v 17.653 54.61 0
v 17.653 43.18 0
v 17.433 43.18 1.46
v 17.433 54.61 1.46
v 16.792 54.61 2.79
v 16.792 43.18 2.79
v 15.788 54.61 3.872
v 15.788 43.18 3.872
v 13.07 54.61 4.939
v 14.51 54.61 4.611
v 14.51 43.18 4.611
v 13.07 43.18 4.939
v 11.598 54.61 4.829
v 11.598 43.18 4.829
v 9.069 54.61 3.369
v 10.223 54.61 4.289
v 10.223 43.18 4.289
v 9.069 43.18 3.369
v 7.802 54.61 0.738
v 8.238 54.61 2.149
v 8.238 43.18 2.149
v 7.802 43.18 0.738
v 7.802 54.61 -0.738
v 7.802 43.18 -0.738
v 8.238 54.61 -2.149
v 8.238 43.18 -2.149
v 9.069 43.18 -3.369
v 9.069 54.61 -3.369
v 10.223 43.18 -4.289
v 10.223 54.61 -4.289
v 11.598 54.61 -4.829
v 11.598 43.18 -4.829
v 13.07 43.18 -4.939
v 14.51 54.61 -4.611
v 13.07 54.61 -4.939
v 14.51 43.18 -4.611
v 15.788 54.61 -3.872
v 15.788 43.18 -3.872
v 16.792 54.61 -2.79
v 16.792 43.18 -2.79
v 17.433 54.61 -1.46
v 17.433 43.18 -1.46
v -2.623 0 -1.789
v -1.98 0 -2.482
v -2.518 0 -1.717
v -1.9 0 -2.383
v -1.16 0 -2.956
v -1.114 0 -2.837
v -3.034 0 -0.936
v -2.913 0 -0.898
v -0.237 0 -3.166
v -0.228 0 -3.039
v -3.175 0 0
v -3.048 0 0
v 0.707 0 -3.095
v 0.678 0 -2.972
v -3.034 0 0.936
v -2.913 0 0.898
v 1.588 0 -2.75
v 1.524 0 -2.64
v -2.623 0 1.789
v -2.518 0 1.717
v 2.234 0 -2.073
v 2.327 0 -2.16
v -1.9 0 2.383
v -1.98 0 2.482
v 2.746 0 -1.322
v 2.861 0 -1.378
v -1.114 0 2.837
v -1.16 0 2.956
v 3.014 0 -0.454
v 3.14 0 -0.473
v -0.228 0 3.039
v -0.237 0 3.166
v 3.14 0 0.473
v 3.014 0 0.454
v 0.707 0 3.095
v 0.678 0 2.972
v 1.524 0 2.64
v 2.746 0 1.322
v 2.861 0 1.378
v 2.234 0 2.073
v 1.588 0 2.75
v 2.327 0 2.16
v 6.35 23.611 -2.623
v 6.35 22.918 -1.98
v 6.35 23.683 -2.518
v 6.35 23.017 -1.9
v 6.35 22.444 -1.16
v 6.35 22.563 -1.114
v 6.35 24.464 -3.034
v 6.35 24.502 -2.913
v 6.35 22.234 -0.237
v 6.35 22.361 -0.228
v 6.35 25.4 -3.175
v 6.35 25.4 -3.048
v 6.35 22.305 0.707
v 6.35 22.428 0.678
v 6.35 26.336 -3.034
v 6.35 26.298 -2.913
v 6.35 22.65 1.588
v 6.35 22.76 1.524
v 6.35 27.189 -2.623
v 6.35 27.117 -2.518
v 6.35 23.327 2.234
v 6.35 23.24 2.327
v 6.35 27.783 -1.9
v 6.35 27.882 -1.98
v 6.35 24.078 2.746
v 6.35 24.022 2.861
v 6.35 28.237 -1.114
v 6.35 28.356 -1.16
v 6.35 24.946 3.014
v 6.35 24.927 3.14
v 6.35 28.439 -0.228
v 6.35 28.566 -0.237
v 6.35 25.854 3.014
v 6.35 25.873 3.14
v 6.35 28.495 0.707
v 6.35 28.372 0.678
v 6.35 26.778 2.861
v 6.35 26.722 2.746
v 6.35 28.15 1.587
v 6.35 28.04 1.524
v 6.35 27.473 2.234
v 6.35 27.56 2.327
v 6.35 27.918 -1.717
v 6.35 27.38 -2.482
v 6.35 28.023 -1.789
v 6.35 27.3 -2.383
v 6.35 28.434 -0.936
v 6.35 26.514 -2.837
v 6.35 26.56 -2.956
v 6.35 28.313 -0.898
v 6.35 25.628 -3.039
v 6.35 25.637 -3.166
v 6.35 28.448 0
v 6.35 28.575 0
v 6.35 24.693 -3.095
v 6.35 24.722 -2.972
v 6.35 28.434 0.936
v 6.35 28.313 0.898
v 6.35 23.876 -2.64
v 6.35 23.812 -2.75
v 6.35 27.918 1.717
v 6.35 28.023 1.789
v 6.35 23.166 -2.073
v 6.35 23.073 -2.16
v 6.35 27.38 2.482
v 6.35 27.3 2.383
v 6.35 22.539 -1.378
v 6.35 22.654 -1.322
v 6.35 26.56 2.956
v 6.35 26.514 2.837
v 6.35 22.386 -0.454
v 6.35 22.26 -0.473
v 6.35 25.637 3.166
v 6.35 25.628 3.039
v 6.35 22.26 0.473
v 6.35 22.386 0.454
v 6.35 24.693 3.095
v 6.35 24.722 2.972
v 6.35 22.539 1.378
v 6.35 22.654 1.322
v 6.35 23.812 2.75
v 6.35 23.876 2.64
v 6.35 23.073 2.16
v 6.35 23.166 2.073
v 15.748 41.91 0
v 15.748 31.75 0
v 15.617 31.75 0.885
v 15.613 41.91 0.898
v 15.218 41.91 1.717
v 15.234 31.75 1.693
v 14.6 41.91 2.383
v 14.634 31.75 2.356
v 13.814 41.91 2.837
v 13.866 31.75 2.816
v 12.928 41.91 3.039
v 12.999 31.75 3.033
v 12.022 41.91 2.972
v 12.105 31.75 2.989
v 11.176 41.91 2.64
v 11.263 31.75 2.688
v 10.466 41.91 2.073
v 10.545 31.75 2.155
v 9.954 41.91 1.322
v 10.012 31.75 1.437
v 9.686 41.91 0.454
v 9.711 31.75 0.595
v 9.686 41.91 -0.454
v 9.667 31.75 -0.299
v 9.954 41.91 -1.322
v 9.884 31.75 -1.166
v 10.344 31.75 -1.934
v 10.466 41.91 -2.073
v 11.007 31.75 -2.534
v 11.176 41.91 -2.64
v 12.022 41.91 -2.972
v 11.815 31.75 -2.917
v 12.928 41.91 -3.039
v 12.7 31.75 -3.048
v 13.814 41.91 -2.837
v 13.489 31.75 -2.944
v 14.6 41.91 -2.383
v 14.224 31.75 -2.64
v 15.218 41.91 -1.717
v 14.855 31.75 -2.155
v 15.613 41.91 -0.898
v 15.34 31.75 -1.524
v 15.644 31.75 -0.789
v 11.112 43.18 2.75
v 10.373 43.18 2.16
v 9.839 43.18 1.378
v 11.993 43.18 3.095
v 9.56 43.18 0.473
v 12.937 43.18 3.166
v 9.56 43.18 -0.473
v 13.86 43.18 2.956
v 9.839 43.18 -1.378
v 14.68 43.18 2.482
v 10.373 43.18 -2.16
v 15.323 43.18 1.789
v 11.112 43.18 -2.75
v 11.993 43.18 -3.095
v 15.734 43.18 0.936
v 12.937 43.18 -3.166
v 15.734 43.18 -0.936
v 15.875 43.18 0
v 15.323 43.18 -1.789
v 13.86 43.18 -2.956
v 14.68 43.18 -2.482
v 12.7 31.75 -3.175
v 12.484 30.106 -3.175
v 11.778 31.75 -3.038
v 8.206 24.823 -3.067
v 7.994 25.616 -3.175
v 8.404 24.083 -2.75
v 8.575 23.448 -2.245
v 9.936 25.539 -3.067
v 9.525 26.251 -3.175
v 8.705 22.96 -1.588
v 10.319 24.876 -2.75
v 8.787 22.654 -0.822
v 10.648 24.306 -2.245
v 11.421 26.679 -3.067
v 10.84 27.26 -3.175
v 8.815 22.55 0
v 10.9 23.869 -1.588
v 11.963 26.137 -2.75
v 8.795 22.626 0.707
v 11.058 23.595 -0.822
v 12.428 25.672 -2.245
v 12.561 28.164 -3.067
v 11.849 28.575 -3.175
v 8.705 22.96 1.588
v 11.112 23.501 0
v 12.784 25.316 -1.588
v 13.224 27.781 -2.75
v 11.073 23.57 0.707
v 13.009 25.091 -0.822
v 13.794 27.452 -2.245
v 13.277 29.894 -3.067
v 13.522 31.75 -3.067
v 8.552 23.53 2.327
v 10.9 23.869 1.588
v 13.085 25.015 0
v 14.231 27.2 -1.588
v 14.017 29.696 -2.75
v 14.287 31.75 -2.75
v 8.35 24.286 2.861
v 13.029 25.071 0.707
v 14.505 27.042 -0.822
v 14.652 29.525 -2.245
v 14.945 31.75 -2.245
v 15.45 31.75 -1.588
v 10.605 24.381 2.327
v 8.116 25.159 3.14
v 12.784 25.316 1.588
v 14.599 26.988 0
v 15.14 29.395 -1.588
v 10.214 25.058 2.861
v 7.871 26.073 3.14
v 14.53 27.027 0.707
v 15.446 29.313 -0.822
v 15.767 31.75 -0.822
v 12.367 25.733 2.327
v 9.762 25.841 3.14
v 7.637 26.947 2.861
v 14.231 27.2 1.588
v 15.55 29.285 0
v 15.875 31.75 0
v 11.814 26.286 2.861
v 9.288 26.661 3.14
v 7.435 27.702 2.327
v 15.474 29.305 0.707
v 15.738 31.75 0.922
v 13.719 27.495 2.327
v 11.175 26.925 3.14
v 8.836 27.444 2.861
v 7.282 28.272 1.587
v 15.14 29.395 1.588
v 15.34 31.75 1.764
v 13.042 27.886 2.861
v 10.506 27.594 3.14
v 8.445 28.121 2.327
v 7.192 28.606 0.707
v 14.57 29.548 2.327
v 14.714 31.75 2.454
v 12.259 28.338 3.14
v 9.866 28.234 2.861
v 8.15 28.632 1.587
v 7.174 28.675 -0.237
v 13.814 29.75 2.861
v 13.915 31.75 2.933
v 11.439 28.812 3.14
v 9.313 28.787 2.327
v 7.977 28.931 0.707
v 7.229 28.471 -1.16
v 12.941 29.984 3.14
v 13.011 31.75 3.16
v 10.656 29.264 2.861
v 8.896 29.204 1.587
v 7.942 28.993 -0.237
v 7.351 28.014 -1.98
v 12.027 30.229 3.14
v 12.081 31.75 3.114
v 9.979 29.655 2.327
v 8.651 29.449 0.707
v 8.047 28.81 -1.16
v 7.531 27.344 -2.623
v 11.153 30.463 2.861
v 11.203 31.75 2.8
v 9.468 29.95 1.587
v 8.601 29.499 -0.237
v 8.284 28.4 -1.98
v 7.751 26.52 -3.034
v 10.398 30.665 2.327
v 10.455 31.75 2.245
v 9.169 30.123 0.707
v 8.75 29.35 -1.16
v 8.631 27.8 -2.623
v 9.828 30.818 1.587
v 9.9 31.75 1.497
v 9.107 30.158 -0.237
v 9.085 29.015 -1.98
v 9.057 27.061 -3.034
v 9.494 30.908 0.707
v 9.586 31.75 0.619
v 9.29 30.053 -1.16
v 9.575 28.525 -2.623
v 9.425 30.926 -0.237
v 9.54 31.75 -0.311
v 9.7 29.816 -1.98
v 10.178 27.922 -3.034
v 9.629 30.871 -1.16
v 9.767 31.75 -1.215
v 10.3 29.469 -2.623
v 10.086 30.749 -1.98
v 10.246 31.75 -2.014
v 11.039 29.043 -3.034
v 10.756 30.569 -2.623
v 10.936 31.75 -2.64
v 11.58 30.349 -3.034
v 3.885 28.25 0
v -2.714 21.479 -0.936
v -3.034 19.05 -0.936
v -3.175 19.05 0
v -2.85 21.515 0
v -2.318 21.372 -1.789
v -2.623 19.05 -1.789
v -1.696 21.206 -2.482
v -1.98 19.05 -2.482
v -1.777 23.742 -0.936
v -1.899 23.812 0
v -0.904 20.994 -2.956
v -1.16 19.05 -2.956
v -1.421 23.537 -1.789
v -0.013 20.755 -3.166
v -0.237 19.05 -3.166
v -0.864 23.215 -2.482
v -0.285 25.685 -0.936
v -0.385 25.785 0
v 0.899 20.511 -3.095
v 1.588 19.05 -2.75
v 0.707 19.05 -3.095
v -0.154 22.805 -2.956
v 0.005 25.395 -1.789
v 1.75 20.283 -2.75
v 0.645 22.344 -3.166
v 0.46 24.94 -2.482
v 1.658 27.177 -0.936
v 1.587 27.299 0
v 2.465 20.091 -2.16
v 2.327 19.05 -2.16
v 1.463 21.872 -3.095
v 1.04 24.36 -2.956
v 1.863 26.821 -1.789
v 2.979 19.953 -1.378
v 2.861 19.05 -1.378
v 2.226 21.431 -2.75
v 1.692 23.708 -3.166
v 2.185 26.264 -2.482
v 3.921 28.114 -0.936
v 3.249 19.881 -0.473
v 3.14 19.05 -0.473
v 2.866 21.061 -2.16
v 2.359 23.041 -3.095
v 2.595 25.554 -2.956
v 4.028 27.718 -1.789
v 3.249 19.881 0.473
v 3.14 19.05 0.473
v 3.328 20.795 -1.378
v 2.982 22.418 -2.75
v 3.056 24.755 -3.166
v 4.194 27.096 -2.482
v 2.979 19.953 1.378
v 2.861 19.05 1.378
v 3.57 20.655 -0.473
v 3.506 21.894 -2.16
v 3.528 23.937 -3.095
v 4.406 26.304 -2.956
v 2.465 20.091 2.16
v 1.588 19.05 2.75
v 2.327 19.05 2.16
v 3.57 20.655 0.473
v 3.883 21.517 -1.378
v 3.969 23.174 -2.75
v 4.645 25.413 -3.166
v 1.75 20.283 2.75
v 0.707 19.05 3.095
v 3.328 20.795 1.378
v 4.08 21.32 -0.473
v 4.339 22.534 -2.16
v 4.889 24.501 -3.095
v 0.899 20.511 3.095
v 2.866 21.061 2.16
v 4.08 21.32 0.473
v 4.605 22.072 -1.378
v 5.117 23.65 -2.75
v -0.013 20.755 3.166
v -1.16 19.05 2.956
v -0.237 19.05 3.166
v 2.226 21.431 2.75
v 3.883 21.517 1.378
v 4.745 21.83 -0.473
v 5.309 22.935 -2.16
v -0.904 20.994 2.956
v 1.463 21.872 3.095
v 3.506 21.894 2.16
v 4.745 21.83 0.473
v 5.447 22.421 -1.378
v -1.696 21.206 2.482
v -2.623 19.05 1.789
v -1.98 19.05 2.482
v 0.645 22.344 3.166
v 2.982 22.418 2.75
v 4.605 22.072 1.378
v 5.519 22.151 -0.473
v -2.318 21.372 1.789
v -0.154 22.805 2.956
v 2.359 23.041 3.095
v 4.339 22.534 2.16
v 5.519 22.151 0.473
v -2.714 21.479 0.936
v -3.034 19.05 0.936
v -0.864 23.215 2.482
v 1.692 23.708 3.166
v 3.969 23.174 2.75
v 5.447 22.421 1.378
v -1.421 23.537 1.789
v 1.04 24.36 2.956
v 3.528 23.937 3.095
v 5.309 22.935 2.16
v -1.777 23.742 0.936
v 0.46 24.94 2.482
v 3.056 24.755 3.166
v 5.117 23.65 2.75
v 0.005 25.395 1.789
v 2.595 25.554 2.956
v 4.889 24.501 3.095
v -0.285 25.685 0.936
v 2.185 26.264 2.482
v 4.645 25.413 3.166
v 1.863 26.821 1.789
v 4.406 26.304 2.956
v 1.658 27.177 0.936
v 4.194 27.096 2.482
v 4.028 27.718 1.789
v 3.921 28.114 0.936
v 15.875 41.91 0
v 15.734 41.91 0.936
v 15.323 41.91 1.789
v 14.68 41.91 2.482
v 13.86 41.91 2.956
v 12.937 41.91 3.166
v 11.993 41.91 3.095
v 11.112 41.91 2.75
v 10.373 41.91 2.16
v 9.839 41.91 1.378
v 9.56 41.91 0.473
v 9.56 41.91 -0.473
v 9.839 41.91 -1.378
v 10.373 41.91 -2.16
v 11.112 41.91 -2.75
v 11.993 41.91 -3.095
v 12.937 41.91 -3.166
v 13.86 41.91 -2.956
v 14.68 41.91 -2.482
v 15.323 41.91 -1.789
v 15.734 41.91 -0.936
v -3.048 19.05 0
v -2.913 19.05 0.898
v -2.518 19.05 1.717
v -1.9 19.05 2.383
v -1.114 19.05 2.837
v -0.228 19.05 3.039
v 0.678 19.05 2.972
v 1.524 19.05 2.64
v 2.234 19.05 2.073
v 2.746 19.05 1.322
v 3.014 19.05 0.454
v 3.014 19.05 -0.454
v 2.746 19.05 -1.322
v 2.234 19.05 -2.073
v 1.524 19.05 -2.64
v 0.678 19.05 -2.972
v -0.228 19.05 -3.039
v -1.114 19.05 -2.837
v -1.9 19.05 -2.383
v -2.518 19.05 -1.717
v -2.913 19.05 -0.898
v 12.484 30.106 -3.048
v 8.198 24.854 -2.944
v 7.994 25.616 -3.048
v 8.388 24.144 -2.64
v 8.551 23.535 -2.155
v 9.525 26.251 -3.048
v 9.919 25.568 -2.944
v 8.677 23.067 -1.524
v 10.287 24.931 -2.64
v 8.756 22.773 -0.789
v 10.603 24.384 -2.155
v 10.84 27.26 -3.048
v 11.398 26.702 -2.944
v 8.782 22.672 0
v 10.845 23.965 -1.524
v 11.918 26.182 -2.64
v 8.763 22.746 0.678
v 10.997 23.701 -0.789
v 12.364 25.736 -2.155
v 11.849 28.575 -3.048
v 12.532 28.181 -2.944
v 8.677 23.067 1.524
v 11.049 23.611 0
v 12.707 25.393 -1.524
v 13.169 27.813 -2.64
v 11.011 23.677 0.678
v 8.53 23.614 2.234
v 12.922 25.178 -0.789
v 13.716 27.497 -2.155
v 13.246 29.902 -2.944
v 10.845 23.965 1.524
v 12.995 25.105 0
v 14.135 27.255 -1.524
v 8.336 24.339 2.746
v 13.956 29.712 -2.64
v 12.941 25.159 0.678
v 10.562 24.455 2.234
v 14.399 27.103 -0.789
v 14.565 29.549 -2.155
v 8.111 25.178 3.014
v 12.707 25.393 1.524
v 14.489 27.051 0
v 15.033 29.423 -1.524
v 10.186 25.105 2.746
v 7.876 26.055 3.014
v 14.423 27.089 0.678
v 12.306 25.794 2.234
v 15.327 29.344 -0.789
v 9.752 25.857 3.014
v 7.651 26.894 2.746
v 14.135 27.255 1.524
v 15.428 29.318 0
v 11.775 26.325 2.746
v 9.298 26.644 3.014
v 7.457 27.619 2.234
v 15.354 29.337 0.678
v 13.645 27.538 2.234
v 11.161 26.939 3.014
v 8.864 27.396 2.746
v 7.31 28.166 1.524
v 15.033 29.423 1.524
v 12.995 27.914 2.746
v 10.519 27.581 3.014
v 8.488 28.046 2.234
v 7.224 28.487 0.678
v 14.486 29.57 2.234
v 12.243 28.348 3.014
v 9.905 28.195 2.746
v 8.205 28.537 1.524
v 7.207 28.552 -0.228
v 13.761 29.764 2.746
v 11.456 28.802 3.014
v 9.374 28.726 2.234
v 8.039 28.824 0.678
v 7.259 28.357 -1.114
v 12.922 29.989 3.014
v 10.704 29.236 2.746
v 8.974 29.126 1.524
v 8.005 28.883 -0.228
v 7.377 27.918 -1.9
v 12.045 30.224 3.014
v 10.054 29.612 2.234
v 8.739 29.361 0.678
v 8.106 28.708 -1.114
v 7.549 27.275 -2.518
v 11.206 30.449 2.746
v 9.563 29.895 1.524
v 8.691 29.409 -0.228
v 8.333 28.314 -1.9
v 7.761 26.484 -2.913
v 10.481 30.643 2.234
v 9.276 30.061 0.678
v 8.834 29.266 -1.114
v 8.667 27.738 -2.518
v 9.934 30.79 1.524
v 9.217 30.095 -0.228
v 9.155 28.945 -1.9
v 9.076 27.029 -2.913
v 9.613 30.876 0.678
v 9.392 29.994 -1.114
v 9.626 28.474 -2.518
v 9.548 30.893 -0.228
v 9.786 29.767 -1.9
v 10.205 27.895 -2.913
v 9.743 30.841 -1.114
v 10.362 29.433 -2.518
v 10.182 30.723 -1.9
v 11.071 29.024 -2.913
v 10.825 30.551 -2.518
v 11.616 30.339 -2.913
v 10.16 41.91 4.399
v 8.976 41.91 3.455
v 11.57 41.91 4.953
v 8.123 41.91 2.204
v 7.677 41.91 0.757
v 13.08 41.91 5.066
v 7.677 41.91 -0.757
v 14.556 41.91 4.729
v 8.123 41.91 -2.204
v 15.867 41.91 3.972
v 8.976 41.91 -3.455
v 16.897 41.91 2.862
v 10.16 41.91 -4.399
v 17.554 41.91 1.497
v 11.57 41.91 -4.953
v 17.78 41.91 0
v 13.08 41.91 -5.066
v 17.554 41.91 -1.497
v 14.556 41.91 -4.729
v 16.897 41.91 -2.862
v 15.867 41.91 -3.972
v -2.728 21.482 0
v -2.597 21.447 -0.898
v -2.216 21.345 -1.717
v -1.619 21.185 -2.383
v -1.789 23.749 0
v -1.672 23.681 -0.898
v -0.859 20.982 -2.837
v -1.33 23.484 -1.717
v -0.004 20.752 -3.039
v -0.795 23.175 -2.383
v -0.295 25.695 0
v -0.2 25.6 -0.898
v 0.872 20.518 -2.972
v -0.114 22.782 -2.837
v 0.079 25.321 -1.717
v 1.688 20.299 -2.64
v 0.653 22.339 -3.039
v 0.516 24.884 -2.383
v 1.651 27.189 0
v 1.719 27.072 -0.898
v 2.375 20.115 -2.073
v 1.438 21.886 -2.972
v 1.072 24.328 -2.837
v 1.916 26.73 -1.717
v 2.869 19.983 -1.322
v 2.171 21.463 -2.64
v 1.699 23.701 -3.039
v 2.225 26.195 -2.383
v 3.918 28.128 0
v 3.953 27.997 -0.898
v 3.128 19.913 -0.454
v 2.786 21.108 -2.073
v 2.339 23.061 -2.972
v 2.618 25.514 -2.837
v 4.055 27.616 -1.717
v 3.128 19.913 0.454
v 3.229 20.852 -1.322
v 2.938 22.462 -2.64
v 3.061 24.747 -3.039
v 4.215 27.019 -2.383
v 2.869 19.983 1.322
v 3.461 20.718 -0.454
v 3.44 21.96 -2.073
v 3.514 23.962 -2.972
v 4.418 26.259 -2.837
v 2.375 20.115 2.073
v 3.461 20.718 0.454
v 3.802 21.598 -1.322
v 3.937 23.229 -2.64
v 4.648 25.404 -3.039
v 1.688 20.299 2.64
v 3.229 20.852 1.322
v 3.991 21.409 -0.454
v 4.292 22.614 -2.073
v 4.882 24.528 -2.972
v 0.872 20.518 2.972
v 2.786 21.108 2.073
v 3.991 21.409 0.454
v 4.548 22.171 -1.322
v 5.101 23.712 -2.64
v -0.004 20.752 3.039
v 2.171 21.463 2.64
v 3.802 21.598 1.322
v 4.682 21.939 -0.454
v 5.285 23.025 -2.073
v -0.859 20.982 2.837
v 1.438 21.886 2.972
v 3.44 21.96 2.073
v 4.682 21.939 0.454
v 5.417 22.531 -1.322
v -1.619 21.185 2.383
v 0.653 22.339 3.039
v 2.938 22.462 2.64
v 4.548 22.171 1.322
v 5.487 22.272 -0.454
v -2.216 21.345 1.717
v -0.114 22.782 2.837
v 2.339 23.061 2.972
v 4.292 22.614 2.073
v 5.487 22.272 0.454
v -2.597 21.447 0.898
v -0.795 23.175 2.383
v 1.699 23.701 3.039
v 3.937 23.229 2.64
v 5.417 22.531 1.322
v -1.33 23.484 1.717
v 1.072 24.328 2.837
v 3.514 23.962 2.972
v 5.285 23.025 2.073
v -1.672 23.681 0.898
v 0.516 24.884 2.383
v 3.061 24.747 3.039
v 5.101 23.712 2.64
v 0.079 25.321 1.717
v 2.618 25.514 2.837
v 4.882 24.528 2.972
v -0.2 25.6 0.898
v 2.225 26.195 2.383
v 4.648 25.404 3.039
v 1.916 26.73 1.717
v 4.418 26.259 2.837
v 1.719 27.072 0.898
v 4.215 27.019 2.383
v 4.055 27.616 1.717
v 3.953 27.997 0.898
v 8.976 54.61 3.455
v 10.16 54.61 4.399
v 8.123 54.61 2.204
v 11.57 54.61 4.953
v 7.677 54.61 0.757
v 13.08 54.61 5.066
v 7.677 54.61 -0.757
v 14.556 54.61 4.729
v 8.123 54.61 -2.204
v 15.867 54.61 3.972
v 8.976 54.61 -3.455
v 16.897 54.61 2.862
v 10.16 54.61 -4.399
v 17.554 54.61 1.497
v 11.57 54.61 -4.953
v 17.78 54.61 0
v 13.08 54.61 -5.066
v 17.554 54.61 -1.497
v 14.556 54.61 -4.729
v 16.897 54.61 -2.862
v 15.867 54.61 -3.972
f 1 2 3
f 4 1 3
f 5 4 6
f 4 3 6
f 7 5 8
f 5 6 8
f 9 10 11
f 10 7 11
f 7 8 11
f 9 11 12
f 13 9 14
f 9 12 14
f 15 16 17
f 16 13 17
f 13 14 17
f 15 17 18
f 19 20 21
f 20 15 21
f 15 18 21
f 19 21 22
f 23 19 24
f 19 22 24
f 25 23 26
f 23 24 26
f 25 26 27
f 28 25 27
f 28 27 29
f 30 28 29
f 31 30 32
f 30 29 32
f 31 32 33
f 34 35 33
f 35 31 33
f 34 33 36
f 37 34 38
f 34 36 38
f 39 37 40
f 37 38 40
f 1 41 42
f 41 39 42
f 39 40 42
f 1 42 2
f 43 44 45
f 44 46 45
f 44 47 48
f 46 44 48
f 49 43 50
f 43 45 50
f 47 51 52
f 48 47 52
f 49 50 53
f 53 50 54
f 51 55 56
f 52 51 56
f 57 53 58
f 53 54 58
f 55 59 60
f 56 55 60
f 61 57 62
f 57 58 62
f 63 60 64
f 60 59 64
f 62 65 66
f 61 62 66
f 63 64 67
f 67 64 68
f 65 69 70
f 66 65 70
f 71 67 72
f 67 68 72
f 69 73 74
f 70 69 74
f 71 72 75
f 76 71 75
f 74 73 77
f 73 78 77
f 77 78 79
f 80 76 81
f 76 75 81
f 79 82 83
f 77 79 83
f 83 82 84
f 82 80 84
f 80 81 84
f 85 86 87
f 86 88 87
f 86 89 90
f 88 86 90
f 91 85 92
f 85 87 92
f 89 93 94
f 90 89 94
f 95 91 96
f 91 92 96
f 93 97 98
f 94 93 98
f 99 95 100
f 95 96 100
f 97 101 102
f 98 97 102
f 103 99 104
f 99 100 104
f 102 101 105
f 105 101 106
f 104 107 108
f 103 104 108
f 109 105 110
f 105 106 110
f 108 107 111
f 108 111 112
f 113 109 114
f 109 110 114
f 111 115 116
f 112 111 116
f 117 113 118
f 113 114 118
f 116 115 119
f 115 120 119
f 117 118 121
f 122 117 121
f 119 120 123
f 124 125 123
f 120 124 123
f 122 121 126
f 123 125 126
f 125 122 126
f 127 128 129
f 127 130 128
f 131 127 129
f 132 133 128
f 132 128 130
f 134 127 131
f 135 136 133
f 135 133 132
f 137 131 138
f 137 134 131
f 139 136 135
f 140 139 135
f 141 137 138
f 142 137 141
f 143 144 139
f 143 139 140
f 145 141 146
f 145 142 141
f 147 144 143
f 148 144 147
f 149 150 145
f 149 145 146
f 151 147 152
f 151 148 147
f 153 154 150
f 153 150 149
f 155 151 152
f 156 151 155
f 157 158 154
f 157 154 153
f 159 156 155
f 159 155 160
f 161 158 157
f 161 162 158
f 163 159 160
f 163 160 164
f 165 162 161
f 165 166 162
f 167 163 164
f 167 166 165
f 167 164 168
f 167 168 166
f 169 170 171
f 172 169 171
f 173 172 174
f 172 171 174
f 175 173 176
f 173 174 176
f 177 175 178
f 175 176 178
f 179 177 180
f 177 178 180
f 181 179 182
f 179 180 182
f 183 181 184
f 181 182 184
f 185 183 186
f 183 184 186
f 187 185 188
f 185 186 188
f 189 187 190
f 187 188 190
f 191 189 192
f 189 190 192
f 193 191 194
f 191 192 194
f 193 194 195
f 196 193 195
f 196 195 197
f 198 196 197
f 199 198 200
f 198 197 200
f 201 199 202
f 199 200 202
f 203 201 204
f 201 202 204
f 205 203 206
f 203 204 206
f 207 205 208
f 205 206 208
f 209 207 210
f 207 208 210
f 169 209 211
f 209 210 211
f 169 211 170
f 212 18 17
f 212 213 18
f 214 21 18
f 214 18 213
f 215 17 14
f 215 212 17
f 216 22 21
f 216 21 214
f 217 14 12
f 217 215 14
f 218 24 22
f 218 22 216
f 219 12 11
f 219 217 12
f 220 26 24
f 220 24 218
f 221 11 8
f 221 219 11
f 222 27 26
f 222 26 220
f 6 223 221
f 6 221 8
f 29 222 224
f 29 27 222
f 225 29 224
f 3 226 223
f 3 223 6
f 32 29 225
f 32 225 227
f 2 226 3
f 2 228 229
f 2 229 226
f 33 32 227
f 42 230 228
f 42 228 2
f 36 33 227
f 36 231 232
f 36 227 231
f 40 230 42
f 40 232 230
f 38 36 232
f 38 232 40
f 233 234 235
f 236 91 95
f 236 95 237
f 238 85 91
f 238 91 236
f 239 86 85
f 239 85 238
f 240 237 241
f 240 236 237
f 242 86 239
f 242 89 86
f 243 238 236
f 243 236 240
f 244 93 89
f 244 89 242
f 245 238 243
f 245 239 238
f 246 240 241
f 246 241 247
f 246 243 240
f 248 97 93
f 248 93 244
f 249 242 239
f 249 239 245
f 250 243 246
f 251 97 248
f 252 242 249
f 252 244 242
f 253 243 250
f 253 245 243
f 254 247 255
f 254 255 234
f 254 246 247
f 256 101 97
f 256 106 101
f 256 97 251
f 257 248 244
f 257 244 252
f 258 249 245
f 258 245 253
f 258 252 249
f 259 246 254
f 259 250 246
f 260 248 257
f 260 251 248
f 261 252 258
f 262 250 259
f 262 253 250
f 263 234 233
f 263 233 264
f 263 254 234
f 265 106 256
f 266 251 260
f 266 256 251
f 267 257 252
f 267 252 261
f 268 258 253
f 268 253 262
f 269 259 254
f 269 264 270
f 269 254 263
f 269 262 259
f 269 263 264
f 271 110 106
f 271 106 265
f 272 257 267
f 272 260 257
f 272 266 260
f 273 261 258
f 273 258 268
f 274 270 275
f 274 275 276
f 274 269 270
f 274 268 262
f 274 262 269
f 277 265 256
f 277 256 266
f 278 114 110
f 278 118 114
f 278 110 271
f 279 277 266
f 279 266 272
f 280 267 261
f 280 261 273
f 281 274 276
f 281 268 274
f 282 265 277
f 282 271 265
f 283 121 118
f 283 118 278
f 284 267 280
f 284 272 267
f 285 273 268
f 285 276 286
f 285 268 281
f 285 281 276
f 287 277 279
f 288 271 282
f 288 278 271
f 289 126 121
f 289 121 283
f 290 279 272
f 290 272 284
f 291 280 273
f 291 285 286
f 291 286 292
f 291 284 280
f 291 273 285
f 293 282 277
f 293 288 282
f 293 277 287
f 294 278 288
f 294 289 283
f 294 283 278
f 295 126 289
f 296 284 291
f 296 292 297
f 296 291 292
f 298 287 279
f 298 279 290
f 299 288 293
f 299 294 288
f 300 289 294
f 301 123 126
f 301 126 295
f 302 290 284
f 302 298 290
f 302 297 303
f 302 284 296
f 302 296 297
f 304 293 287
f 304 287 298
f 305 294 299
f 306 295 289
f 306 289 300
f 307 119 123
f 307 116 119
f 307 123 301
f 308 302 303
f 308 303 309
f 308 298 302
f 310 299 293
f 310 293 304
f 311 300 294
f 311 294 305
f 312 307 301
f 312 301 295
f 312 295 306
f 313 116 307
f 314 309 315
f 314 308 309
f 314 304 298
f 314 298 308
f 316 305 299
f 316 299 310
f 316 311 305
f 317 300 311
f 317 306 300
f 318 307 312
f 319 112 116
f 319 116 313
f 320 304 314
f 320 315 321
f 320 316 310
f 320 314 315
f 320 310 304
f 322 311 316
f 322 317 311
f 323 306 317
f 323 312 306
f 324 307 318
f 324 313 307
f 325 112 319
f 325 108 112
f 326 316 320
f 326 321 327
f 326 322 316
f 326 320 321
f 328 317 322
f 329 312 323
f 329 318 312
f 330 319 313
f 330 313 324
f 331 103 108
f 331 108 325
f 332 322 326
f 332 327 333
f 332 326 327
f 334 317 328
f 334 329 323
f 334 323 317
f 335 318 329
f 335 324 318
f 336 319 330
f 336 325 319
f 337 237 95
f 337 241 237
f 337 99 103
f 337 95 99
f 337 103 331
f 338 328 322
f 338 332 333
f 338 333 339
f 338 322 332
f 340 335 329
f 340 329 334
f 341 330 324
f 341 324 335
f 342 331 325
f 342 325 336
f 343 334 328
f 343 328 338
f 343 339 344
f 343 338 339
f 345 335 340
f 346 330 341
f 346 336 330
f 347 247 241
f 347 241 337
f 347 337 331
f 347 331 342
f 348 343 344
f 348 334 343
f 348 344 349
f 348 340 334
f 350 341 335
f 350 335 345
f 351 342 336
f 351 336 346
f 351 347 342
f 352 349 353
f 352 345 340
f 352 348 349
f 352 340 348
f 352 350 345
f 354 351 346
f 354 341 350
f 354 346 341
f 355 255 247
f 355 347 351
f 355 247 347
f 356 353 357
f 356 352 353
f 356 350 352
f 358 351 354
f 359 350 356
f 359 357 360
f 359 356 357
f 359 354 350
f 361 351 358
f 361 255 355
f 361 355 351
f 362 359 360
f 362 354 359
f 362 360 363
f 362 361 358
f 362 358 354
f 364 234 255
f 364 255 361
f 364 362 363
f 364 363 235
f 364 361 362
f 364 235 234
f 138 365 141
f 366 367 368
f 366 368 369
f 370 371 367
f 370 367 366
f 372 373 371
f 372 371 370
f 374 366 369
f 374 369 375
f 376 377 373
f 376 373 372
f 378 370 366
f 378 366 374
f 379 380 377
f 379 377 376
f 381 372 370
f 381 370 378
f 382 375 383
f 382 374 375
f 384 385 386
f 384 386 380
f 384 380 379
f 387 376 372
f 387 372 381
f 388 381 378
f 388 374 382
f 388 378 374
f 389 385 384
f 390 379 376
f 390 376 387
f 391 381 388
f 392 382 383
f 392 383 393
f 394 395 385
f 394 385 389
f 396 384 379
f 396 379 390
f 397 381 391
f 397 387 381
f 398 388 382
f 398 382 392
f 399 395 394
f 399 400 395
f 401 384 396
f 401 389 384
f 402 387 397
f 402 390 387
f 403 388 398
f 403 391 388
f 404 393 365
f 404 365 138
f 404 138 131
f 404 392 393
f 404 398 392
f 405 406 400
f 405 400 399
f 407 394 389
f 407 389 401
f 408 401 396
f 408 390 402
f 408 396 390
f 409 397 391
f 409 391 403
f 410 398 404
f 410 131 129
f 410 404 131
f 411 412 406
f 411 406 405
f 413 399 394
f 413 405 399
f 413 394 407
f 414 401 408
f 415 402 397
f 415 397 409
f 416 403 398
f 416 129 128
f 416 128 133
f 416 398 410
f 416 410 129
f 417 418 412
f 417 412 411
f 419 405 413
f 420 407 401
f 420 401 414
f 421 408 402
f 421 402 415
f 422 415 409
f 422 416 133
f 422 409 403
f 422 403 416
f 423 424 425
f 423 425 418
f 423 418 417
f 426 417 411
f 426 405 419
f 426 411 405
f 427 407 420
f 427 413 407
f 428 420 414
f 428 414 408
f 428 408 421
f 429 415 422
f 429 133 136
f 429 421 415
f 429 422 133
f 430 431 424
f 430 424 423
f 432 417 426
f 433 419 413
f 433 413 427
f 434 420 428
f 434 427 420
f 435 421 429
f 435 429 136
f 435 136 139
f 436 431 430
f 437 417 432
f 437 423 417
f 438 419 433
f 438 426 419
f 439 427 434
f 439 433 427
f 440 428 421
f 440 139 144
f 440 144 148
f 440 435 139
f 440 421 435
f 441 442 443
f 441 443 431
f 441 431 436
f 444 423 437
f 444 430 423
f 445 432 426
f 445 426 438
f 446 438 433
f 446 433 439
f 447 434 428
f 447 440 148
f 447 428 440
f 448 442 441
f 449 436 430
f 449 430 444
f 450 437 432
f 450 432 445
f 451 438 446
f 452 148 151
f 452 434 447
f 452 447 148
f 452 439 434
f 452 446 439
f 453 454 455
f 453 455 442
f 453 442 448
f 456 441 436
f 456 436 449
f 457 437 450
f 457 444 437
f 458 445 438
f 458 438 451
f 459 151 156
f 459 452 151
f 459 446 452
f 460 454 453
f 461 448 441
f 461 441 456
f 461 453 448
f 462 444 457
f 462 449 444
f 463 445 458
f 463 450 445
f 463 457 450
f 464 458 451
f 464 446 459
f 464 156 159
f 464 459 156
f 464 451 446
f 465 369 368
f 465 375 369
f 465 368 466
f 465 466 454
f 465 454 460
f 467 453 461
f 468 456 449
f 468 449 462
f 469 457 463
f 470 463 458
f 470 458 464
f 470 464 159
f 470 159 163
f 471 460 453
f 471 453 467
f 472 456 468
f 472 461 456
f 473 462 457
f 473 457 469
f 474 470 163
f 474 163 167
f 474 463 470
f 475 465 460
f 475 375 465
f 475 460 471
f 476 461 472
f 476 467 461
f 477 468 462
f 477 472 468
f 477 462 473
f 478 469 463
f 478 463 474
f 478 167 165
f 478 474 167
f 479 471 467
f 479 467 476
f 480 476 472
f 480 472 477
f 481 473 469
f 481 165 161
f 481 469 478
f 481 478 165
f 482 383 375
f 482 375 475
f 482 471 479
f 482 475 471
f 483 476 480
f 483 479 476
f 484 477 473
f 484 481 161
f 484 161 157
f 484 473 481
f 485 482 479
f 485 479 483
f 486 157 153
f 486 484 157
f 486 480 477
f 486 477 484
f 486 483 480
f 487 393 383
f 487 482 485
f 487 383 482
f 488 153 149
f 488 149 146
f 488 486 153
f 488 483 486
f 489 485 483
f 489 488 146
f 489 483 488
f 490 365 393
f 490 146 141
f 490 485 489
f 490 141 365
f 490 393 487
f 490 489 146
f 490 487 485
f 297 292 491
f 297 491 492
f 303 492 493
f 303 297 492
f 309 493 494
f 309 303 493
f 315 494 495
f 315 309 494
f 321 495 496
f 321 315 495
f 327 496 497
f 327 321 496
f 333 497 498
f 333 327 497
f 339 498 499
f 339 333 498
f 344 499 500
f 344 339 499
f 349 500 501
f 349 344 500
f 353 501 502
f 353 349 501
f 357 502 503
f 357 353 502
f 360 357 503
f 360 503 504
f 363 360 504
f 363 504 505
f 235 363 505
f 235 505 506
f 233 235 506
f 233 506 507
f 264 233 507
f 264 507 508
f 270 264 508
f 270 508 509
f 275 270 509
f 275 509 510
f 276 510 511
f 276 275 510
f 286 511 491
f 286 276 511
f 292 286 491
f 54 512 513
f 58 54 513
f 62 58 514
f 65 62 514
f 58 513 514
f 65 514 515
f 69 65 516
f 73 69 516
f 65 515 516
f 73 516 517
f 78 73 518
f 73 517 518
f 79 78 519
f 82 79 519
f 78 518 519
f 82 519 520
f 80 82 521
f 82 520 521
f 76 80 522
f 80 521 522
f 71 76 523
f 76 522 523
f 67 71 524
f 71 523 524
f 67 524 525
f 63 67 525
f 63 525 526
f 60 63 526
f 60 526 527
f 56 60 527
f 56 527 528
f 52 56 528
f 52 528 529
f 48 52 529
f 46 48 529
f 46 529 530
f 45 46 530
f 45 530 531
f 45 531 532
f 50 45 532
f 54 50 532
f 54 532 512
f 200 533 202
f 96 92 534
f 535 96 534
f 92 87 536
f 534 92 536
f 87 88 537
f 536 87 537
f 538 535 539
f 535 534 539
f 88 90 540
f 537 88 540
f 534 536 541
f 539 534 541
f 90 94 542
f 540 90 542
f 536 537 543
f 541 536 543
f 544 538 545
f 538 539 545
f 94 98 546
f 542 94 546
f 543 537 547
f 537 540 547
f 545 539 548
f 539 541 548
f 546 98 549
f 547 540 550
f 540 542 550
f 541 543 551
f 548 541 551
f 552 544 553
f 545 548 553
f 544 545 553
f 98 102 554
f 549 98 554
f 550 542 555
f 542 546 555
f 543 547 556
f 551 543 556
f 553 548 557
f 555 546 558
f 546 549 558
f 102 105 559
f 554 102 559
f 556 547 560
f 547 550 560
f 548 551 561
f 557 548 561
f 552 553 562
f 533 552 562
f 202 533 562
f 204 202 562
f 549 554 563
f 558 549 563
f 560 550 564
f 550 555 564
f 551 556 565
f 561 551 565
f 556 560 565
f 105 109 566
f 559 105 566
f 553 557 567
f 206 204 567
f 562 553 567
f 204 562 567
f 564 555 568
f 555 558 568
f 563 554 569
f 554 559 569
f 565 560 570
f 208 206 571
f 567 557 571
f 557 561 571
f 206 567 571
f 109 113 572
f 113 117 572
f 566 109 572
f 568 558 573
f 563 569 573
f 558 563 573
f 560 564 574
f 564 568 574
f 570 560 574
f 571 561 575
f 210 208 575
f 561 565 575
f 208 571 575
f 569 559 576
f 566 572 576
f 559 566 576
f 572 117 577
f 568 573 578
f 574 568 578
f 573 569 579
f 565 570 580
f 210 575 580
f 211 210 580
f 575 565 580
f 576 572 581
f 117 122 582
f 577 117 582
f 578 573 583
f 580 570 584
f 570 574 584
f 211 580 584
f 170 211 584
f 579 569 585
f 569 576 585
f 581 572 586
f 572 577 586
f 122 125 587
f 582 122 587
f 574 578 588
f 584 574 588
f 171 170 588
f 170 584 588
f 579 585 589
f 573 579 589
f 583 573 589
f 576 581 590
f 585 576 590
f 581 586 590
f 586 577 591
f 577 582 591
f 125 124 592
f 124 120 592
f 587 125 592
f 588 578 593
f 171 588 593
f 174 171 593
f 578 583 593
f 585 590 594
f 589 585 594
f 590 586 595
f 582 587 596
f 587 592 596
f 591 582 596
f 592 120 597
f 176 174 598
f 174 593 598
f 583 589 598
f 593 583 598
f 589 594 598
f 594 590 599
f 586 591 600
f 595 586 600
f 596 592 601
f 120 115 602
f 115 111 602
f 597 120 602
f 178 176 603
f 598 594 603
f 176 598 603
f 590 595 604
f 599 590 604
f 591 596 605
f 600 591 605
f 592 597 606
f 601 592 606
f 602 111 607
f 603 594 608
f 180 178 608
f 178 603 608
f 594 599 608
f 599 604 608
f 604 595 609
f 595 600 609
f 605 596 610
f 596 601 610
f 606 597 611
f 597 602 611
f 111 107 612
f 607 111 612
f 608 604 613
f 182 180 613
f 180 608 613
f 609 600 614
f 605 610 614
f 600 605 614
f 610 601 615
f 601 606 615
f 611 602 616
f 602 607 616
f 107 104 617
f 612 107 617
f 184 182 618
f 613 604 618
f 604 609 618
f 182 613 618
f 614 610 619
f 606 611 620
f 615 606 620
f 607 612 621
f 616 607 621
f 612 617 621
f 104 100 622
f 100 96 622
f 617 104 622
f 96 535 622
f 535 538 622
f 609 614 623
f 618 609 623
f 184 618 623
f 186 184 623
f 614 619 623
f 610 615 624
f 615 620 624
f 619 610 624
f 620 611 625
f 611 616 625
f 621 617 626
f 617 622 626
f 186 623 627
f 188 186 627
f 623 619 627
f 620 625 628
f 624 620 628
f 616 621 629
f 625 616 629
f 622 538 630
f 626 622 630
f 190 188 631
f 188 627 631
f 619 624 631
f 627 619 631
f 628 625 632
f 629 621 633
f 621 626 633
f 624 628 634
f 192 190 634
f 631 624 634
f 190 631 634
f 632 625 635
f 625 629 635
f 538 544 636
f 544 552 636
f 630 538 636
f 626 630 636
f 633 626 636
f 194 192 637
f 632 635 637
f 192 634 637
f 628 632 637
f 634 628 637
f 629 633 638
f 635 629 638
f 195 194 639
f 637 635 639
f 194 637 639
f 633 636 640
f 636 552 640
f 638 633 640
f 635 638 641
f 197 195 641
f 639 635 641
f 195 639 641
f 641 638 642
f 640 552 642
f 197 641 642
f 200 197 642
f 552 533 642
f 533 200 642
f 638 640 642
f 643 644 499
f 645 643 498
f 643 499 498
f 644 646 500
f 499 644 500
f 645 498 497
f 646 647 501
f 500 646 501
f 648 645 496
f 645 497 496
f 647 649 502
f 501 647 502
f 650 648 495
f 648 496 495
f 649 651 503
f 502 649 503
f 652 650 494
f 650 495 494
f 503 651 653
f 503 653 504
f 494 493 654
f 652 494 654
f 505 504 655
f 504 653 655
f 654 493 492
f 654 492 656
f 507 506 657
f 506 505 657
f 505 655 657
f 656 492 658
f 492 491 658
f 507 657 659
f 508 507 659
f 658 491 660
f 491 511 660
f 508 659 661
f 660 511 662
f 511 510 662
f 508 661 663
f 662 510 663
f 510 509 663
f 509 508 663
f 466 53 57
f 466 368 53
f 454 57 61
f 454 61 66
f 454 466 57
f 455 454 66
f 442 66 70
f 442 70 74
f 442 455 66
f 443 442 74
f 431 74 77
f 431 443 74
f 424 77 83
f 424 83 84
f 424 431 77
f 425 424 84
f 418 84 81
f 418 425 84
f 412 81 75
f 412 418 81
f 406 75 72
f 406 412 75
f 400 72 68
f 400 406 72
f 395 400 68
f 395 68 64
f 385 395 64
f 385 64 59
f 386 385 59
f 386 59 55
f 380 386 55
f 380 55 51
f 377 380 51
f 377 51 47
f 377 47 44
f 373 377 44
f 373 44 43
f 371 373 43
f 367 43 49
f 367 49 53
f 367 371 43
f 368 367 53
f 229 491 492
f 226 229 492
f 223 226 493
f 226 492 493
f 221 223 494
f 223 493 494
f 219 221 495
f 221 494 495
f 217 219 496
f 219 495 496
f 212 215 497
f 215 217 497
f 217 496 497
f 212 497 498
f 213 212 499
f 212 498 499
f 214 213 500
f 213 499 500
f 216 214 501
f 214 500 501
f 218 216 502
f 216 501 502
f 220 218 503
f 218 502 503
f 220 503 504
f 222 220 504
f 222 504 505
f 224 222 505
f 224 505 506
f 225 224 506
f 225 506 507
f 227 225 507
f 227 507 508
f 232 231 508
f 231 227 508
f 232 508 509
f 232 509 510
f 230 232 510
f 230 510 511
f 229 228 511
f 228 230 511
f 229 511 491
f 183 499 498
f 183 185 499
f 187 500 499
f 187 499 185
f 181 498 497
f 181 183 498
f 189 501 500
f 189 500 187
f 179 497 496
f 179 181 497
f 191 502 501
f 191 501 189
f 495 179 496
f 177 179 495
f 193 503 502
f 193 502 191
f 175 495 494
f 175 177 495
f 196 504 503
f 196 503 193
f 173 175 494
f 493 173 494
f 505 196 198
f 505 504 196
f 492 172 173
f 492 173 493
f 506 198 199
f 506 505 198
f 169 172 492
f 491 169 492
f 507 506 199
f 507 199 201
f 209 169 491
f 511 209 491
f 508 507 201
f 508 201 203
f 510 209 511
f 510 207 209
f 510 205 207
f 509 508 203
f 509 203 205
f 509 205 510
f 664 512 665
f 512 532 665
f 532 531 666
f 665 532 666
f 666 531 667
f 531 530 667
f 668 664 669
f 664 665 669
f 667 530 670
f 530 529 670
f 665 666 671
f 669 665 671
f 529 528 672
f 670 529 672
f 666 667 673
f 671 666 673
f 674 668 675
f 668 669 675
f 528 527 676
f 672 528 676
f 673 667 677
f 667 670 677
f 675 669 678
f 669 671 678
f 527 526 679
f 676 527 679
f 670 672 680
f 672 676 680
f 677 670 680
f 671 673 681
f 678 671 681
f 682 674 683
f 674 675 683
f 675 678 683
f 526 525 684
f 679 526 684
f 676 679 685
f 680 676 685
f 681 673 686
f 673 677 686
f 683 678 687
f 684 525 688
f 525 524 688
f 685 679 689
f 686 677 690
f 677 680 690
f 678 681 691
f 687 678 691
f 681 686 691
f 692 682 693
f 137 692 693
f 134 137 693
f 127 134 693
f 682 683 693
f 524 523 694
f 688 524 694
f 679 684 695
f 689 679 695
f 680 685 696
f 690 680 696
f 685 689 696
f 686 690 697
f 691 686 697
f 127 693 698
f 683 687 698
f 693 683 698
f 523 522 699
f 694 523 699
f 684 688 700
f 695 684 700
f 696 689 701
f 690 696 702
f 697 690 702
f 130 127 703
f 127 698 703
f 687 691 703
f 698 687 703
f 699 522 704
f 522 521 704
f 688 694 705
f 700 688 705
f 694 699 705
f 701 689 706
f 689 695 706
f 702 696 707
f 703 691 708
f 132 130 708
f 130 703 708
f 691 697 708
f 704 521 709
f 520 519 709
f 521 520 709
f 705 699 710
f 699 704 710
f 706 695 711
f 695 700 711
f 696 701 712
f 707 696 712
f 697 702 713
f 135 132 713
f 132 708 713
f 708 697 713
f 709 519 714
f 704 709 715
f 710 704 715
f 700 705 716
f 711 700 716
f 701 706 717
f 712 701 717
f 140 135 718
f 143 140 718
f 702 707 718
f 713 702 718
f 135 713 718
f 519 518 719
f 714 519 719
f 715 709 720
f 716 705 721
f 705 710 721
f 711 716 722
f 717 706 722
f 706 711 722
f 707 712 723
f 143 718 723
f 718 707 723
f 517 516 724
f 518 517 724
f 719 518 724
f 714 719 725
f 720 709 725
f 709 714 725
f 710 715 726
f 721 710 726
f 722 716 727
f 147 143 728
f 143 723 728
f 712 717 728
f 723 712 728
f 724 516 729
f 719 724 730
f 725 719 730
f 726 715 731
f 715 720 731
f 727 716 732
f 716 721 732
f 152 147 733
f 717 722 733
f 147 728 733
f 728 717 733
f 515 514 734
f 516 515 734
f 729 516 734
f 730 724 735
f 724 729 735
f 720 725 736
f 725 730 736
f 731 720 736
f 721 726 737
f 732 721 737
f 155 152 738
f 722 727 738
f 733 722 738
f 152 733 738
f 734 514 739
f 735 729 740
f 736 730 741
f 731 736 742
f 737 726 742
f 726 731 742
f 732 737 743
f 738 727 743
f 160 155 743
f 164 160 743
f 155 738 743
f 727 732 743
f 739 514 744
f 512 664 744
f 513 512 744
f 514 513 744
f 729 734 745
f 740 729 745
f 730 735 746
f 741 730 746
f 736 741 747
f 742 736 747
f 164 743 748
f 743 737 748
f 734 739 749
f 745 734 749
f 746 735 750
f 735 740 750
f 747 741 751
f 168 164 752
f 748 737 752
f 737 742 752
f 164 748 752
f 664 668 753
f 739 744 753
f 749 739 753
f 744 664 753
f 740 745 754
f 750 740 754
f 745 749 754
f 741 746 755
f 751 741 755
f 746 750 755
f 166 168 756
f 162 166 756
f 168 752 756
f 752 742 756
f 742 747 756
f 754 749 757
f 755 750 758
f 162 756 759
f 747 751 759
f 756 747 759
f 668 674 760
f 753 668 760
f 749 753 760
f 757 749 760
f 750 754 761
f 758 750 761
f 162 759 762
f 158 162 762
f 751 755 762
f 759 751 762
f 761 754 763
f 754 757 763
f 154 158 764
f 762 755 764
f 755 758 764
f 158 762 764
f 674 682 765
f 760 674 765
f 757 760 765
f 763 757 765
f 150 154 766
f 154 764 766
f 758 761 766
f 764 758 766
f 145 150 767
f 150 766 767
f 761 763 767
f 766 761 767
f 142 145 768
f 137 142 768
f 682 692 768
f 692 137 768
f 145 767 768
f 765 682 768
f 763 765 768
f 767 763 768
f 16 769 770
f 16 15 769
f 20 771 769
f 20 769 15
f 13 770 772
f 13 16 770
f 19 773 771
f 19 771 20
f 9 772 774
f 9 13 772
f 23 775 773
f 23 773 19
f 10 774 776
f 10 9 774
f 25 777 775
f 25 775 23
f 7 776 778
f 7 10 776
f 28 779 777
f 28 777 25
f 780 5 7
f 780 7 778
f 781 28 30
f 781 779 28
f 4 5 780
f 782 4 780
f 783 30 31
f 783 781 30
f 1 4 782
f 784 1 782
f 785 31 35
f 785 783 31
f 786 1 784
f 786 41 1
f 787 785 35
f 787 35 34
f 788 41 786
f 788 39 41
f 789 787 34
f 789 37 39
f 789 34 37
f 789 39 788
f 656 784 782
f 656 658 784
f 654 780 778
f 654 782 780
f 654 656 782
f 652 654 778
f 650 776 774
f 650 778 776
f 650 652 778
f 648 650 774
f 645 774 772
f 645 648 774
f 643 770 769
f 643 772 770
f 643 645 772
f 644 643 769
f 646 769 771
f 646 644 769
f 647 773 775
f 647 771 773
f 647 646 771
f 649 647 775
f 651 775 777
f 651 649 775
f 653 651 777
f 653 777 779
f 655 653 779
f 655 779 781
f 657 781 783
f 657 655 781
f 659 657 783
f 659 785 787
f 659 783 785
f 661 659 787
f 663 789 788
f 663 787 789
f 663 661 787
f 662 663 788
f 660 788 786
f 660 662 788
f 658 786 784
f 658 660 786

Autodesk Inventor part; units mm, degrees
ref_plane "YZ Plane" through (0, 0, 0) normal (1, 0, 0) x (0, 1, 0)
ref_plane "XZ Plane" through (0, 0, 0) normal (0, 1, 0) x (-1, 0, 0)
ref_plane "XY Plane" through (0, 0, 0) normal (0, 0, 1) x (1, 0, 0)
sketch "Sketch5" plane through (0, 0, 0) normal (0, 0, 1) x (1, 0, 0)
  line L0 (0, 0) -> (0, 19.05)
  line L1 (0, 0) -> (0, 19.05)
  arc A0 (6.35, 25.4) -> (0, 19.05) centre (6.35, 19.05) ccw
  arc A1 (6.35, 25.4) -> (12.7, 31.75) centre (6.35, 31.75) ccw
  line L2 (12.7, 31.75) -> (12.7, 38.1)
  dimension "d17" = 19.05
sketch "Sketch6" plane through (0, 0, 0) normal (0, 1, 0) x (-1, 0, 0)
  circle A0 centre (0, 0) radius 3.175
  circle A1 centre (0, 0) radius 3.048
  dimension "d23" = 6.35
  dimension "d24" = 6.096
sweep "Sweep2" add profiles "Sketch6" path "Sketch5" path curves L0 A0
sketch "Sketch7" plane through (0, 0, 0) normal (0, 0, 1) x (1, 0, 0)
  line L0 (6.35, 22.225) -> (6.35, 28.575) projected
  arc A0 (6.35, 25.4) -> (12.7, 31.75) centre (6.35, 31.75) ccw
  point P0 (0, 0)
sketch "Sketch8" plane through (6.35, 25.4, 0) normal (1, 0, 0) x (0, 0, -1)
  circle A0 centre (0, 0) radius 3.175 projected
  circle A1 centre (0, 0) radius 3.048 projected
  point P0 (0, -25.4)
sweep "Sweep3" add profiles "Sketch8" path "Sketch7" separate body path curves A0
sketch "Sketch10" plane through (12.7, 31.75, 0) normal (0, 1, 0) x (1, 0, 0)
  circle A0 centre (0, 0) radius 3.048 projected
  circle A1 centre (0, 0) radius 3.175 projected
  point P0 (-12.7, 0)
extrude "Extrusion6" add sketch "Sketch10" along normal blind 10.16 bodies 2
sketch "Sketch11" plane through (12.7, 41.91, 0) normal (0, 1, 0) x (1, 0, 0)
  circle A0 centre (0, 0) radius 3.048 projected
  circle A1 centre (0, 0) radius 3.175 projected
  circle A2 centre (0, 0) radius 5.08
  circle A3 centre (0, 0) radius 4.953
  point P0 (-12.7, 0)
  dimension "d38" = 10.16
  dimension "d39" = 9.906
extrude "Extrusion7" add sketch "Sketch11" along normal blind 1.27 contours A3 bodies 2
extrude "Extrusion8" add sketch "Sketch11" along normal blind 12.7 contours A2 bodies 2
